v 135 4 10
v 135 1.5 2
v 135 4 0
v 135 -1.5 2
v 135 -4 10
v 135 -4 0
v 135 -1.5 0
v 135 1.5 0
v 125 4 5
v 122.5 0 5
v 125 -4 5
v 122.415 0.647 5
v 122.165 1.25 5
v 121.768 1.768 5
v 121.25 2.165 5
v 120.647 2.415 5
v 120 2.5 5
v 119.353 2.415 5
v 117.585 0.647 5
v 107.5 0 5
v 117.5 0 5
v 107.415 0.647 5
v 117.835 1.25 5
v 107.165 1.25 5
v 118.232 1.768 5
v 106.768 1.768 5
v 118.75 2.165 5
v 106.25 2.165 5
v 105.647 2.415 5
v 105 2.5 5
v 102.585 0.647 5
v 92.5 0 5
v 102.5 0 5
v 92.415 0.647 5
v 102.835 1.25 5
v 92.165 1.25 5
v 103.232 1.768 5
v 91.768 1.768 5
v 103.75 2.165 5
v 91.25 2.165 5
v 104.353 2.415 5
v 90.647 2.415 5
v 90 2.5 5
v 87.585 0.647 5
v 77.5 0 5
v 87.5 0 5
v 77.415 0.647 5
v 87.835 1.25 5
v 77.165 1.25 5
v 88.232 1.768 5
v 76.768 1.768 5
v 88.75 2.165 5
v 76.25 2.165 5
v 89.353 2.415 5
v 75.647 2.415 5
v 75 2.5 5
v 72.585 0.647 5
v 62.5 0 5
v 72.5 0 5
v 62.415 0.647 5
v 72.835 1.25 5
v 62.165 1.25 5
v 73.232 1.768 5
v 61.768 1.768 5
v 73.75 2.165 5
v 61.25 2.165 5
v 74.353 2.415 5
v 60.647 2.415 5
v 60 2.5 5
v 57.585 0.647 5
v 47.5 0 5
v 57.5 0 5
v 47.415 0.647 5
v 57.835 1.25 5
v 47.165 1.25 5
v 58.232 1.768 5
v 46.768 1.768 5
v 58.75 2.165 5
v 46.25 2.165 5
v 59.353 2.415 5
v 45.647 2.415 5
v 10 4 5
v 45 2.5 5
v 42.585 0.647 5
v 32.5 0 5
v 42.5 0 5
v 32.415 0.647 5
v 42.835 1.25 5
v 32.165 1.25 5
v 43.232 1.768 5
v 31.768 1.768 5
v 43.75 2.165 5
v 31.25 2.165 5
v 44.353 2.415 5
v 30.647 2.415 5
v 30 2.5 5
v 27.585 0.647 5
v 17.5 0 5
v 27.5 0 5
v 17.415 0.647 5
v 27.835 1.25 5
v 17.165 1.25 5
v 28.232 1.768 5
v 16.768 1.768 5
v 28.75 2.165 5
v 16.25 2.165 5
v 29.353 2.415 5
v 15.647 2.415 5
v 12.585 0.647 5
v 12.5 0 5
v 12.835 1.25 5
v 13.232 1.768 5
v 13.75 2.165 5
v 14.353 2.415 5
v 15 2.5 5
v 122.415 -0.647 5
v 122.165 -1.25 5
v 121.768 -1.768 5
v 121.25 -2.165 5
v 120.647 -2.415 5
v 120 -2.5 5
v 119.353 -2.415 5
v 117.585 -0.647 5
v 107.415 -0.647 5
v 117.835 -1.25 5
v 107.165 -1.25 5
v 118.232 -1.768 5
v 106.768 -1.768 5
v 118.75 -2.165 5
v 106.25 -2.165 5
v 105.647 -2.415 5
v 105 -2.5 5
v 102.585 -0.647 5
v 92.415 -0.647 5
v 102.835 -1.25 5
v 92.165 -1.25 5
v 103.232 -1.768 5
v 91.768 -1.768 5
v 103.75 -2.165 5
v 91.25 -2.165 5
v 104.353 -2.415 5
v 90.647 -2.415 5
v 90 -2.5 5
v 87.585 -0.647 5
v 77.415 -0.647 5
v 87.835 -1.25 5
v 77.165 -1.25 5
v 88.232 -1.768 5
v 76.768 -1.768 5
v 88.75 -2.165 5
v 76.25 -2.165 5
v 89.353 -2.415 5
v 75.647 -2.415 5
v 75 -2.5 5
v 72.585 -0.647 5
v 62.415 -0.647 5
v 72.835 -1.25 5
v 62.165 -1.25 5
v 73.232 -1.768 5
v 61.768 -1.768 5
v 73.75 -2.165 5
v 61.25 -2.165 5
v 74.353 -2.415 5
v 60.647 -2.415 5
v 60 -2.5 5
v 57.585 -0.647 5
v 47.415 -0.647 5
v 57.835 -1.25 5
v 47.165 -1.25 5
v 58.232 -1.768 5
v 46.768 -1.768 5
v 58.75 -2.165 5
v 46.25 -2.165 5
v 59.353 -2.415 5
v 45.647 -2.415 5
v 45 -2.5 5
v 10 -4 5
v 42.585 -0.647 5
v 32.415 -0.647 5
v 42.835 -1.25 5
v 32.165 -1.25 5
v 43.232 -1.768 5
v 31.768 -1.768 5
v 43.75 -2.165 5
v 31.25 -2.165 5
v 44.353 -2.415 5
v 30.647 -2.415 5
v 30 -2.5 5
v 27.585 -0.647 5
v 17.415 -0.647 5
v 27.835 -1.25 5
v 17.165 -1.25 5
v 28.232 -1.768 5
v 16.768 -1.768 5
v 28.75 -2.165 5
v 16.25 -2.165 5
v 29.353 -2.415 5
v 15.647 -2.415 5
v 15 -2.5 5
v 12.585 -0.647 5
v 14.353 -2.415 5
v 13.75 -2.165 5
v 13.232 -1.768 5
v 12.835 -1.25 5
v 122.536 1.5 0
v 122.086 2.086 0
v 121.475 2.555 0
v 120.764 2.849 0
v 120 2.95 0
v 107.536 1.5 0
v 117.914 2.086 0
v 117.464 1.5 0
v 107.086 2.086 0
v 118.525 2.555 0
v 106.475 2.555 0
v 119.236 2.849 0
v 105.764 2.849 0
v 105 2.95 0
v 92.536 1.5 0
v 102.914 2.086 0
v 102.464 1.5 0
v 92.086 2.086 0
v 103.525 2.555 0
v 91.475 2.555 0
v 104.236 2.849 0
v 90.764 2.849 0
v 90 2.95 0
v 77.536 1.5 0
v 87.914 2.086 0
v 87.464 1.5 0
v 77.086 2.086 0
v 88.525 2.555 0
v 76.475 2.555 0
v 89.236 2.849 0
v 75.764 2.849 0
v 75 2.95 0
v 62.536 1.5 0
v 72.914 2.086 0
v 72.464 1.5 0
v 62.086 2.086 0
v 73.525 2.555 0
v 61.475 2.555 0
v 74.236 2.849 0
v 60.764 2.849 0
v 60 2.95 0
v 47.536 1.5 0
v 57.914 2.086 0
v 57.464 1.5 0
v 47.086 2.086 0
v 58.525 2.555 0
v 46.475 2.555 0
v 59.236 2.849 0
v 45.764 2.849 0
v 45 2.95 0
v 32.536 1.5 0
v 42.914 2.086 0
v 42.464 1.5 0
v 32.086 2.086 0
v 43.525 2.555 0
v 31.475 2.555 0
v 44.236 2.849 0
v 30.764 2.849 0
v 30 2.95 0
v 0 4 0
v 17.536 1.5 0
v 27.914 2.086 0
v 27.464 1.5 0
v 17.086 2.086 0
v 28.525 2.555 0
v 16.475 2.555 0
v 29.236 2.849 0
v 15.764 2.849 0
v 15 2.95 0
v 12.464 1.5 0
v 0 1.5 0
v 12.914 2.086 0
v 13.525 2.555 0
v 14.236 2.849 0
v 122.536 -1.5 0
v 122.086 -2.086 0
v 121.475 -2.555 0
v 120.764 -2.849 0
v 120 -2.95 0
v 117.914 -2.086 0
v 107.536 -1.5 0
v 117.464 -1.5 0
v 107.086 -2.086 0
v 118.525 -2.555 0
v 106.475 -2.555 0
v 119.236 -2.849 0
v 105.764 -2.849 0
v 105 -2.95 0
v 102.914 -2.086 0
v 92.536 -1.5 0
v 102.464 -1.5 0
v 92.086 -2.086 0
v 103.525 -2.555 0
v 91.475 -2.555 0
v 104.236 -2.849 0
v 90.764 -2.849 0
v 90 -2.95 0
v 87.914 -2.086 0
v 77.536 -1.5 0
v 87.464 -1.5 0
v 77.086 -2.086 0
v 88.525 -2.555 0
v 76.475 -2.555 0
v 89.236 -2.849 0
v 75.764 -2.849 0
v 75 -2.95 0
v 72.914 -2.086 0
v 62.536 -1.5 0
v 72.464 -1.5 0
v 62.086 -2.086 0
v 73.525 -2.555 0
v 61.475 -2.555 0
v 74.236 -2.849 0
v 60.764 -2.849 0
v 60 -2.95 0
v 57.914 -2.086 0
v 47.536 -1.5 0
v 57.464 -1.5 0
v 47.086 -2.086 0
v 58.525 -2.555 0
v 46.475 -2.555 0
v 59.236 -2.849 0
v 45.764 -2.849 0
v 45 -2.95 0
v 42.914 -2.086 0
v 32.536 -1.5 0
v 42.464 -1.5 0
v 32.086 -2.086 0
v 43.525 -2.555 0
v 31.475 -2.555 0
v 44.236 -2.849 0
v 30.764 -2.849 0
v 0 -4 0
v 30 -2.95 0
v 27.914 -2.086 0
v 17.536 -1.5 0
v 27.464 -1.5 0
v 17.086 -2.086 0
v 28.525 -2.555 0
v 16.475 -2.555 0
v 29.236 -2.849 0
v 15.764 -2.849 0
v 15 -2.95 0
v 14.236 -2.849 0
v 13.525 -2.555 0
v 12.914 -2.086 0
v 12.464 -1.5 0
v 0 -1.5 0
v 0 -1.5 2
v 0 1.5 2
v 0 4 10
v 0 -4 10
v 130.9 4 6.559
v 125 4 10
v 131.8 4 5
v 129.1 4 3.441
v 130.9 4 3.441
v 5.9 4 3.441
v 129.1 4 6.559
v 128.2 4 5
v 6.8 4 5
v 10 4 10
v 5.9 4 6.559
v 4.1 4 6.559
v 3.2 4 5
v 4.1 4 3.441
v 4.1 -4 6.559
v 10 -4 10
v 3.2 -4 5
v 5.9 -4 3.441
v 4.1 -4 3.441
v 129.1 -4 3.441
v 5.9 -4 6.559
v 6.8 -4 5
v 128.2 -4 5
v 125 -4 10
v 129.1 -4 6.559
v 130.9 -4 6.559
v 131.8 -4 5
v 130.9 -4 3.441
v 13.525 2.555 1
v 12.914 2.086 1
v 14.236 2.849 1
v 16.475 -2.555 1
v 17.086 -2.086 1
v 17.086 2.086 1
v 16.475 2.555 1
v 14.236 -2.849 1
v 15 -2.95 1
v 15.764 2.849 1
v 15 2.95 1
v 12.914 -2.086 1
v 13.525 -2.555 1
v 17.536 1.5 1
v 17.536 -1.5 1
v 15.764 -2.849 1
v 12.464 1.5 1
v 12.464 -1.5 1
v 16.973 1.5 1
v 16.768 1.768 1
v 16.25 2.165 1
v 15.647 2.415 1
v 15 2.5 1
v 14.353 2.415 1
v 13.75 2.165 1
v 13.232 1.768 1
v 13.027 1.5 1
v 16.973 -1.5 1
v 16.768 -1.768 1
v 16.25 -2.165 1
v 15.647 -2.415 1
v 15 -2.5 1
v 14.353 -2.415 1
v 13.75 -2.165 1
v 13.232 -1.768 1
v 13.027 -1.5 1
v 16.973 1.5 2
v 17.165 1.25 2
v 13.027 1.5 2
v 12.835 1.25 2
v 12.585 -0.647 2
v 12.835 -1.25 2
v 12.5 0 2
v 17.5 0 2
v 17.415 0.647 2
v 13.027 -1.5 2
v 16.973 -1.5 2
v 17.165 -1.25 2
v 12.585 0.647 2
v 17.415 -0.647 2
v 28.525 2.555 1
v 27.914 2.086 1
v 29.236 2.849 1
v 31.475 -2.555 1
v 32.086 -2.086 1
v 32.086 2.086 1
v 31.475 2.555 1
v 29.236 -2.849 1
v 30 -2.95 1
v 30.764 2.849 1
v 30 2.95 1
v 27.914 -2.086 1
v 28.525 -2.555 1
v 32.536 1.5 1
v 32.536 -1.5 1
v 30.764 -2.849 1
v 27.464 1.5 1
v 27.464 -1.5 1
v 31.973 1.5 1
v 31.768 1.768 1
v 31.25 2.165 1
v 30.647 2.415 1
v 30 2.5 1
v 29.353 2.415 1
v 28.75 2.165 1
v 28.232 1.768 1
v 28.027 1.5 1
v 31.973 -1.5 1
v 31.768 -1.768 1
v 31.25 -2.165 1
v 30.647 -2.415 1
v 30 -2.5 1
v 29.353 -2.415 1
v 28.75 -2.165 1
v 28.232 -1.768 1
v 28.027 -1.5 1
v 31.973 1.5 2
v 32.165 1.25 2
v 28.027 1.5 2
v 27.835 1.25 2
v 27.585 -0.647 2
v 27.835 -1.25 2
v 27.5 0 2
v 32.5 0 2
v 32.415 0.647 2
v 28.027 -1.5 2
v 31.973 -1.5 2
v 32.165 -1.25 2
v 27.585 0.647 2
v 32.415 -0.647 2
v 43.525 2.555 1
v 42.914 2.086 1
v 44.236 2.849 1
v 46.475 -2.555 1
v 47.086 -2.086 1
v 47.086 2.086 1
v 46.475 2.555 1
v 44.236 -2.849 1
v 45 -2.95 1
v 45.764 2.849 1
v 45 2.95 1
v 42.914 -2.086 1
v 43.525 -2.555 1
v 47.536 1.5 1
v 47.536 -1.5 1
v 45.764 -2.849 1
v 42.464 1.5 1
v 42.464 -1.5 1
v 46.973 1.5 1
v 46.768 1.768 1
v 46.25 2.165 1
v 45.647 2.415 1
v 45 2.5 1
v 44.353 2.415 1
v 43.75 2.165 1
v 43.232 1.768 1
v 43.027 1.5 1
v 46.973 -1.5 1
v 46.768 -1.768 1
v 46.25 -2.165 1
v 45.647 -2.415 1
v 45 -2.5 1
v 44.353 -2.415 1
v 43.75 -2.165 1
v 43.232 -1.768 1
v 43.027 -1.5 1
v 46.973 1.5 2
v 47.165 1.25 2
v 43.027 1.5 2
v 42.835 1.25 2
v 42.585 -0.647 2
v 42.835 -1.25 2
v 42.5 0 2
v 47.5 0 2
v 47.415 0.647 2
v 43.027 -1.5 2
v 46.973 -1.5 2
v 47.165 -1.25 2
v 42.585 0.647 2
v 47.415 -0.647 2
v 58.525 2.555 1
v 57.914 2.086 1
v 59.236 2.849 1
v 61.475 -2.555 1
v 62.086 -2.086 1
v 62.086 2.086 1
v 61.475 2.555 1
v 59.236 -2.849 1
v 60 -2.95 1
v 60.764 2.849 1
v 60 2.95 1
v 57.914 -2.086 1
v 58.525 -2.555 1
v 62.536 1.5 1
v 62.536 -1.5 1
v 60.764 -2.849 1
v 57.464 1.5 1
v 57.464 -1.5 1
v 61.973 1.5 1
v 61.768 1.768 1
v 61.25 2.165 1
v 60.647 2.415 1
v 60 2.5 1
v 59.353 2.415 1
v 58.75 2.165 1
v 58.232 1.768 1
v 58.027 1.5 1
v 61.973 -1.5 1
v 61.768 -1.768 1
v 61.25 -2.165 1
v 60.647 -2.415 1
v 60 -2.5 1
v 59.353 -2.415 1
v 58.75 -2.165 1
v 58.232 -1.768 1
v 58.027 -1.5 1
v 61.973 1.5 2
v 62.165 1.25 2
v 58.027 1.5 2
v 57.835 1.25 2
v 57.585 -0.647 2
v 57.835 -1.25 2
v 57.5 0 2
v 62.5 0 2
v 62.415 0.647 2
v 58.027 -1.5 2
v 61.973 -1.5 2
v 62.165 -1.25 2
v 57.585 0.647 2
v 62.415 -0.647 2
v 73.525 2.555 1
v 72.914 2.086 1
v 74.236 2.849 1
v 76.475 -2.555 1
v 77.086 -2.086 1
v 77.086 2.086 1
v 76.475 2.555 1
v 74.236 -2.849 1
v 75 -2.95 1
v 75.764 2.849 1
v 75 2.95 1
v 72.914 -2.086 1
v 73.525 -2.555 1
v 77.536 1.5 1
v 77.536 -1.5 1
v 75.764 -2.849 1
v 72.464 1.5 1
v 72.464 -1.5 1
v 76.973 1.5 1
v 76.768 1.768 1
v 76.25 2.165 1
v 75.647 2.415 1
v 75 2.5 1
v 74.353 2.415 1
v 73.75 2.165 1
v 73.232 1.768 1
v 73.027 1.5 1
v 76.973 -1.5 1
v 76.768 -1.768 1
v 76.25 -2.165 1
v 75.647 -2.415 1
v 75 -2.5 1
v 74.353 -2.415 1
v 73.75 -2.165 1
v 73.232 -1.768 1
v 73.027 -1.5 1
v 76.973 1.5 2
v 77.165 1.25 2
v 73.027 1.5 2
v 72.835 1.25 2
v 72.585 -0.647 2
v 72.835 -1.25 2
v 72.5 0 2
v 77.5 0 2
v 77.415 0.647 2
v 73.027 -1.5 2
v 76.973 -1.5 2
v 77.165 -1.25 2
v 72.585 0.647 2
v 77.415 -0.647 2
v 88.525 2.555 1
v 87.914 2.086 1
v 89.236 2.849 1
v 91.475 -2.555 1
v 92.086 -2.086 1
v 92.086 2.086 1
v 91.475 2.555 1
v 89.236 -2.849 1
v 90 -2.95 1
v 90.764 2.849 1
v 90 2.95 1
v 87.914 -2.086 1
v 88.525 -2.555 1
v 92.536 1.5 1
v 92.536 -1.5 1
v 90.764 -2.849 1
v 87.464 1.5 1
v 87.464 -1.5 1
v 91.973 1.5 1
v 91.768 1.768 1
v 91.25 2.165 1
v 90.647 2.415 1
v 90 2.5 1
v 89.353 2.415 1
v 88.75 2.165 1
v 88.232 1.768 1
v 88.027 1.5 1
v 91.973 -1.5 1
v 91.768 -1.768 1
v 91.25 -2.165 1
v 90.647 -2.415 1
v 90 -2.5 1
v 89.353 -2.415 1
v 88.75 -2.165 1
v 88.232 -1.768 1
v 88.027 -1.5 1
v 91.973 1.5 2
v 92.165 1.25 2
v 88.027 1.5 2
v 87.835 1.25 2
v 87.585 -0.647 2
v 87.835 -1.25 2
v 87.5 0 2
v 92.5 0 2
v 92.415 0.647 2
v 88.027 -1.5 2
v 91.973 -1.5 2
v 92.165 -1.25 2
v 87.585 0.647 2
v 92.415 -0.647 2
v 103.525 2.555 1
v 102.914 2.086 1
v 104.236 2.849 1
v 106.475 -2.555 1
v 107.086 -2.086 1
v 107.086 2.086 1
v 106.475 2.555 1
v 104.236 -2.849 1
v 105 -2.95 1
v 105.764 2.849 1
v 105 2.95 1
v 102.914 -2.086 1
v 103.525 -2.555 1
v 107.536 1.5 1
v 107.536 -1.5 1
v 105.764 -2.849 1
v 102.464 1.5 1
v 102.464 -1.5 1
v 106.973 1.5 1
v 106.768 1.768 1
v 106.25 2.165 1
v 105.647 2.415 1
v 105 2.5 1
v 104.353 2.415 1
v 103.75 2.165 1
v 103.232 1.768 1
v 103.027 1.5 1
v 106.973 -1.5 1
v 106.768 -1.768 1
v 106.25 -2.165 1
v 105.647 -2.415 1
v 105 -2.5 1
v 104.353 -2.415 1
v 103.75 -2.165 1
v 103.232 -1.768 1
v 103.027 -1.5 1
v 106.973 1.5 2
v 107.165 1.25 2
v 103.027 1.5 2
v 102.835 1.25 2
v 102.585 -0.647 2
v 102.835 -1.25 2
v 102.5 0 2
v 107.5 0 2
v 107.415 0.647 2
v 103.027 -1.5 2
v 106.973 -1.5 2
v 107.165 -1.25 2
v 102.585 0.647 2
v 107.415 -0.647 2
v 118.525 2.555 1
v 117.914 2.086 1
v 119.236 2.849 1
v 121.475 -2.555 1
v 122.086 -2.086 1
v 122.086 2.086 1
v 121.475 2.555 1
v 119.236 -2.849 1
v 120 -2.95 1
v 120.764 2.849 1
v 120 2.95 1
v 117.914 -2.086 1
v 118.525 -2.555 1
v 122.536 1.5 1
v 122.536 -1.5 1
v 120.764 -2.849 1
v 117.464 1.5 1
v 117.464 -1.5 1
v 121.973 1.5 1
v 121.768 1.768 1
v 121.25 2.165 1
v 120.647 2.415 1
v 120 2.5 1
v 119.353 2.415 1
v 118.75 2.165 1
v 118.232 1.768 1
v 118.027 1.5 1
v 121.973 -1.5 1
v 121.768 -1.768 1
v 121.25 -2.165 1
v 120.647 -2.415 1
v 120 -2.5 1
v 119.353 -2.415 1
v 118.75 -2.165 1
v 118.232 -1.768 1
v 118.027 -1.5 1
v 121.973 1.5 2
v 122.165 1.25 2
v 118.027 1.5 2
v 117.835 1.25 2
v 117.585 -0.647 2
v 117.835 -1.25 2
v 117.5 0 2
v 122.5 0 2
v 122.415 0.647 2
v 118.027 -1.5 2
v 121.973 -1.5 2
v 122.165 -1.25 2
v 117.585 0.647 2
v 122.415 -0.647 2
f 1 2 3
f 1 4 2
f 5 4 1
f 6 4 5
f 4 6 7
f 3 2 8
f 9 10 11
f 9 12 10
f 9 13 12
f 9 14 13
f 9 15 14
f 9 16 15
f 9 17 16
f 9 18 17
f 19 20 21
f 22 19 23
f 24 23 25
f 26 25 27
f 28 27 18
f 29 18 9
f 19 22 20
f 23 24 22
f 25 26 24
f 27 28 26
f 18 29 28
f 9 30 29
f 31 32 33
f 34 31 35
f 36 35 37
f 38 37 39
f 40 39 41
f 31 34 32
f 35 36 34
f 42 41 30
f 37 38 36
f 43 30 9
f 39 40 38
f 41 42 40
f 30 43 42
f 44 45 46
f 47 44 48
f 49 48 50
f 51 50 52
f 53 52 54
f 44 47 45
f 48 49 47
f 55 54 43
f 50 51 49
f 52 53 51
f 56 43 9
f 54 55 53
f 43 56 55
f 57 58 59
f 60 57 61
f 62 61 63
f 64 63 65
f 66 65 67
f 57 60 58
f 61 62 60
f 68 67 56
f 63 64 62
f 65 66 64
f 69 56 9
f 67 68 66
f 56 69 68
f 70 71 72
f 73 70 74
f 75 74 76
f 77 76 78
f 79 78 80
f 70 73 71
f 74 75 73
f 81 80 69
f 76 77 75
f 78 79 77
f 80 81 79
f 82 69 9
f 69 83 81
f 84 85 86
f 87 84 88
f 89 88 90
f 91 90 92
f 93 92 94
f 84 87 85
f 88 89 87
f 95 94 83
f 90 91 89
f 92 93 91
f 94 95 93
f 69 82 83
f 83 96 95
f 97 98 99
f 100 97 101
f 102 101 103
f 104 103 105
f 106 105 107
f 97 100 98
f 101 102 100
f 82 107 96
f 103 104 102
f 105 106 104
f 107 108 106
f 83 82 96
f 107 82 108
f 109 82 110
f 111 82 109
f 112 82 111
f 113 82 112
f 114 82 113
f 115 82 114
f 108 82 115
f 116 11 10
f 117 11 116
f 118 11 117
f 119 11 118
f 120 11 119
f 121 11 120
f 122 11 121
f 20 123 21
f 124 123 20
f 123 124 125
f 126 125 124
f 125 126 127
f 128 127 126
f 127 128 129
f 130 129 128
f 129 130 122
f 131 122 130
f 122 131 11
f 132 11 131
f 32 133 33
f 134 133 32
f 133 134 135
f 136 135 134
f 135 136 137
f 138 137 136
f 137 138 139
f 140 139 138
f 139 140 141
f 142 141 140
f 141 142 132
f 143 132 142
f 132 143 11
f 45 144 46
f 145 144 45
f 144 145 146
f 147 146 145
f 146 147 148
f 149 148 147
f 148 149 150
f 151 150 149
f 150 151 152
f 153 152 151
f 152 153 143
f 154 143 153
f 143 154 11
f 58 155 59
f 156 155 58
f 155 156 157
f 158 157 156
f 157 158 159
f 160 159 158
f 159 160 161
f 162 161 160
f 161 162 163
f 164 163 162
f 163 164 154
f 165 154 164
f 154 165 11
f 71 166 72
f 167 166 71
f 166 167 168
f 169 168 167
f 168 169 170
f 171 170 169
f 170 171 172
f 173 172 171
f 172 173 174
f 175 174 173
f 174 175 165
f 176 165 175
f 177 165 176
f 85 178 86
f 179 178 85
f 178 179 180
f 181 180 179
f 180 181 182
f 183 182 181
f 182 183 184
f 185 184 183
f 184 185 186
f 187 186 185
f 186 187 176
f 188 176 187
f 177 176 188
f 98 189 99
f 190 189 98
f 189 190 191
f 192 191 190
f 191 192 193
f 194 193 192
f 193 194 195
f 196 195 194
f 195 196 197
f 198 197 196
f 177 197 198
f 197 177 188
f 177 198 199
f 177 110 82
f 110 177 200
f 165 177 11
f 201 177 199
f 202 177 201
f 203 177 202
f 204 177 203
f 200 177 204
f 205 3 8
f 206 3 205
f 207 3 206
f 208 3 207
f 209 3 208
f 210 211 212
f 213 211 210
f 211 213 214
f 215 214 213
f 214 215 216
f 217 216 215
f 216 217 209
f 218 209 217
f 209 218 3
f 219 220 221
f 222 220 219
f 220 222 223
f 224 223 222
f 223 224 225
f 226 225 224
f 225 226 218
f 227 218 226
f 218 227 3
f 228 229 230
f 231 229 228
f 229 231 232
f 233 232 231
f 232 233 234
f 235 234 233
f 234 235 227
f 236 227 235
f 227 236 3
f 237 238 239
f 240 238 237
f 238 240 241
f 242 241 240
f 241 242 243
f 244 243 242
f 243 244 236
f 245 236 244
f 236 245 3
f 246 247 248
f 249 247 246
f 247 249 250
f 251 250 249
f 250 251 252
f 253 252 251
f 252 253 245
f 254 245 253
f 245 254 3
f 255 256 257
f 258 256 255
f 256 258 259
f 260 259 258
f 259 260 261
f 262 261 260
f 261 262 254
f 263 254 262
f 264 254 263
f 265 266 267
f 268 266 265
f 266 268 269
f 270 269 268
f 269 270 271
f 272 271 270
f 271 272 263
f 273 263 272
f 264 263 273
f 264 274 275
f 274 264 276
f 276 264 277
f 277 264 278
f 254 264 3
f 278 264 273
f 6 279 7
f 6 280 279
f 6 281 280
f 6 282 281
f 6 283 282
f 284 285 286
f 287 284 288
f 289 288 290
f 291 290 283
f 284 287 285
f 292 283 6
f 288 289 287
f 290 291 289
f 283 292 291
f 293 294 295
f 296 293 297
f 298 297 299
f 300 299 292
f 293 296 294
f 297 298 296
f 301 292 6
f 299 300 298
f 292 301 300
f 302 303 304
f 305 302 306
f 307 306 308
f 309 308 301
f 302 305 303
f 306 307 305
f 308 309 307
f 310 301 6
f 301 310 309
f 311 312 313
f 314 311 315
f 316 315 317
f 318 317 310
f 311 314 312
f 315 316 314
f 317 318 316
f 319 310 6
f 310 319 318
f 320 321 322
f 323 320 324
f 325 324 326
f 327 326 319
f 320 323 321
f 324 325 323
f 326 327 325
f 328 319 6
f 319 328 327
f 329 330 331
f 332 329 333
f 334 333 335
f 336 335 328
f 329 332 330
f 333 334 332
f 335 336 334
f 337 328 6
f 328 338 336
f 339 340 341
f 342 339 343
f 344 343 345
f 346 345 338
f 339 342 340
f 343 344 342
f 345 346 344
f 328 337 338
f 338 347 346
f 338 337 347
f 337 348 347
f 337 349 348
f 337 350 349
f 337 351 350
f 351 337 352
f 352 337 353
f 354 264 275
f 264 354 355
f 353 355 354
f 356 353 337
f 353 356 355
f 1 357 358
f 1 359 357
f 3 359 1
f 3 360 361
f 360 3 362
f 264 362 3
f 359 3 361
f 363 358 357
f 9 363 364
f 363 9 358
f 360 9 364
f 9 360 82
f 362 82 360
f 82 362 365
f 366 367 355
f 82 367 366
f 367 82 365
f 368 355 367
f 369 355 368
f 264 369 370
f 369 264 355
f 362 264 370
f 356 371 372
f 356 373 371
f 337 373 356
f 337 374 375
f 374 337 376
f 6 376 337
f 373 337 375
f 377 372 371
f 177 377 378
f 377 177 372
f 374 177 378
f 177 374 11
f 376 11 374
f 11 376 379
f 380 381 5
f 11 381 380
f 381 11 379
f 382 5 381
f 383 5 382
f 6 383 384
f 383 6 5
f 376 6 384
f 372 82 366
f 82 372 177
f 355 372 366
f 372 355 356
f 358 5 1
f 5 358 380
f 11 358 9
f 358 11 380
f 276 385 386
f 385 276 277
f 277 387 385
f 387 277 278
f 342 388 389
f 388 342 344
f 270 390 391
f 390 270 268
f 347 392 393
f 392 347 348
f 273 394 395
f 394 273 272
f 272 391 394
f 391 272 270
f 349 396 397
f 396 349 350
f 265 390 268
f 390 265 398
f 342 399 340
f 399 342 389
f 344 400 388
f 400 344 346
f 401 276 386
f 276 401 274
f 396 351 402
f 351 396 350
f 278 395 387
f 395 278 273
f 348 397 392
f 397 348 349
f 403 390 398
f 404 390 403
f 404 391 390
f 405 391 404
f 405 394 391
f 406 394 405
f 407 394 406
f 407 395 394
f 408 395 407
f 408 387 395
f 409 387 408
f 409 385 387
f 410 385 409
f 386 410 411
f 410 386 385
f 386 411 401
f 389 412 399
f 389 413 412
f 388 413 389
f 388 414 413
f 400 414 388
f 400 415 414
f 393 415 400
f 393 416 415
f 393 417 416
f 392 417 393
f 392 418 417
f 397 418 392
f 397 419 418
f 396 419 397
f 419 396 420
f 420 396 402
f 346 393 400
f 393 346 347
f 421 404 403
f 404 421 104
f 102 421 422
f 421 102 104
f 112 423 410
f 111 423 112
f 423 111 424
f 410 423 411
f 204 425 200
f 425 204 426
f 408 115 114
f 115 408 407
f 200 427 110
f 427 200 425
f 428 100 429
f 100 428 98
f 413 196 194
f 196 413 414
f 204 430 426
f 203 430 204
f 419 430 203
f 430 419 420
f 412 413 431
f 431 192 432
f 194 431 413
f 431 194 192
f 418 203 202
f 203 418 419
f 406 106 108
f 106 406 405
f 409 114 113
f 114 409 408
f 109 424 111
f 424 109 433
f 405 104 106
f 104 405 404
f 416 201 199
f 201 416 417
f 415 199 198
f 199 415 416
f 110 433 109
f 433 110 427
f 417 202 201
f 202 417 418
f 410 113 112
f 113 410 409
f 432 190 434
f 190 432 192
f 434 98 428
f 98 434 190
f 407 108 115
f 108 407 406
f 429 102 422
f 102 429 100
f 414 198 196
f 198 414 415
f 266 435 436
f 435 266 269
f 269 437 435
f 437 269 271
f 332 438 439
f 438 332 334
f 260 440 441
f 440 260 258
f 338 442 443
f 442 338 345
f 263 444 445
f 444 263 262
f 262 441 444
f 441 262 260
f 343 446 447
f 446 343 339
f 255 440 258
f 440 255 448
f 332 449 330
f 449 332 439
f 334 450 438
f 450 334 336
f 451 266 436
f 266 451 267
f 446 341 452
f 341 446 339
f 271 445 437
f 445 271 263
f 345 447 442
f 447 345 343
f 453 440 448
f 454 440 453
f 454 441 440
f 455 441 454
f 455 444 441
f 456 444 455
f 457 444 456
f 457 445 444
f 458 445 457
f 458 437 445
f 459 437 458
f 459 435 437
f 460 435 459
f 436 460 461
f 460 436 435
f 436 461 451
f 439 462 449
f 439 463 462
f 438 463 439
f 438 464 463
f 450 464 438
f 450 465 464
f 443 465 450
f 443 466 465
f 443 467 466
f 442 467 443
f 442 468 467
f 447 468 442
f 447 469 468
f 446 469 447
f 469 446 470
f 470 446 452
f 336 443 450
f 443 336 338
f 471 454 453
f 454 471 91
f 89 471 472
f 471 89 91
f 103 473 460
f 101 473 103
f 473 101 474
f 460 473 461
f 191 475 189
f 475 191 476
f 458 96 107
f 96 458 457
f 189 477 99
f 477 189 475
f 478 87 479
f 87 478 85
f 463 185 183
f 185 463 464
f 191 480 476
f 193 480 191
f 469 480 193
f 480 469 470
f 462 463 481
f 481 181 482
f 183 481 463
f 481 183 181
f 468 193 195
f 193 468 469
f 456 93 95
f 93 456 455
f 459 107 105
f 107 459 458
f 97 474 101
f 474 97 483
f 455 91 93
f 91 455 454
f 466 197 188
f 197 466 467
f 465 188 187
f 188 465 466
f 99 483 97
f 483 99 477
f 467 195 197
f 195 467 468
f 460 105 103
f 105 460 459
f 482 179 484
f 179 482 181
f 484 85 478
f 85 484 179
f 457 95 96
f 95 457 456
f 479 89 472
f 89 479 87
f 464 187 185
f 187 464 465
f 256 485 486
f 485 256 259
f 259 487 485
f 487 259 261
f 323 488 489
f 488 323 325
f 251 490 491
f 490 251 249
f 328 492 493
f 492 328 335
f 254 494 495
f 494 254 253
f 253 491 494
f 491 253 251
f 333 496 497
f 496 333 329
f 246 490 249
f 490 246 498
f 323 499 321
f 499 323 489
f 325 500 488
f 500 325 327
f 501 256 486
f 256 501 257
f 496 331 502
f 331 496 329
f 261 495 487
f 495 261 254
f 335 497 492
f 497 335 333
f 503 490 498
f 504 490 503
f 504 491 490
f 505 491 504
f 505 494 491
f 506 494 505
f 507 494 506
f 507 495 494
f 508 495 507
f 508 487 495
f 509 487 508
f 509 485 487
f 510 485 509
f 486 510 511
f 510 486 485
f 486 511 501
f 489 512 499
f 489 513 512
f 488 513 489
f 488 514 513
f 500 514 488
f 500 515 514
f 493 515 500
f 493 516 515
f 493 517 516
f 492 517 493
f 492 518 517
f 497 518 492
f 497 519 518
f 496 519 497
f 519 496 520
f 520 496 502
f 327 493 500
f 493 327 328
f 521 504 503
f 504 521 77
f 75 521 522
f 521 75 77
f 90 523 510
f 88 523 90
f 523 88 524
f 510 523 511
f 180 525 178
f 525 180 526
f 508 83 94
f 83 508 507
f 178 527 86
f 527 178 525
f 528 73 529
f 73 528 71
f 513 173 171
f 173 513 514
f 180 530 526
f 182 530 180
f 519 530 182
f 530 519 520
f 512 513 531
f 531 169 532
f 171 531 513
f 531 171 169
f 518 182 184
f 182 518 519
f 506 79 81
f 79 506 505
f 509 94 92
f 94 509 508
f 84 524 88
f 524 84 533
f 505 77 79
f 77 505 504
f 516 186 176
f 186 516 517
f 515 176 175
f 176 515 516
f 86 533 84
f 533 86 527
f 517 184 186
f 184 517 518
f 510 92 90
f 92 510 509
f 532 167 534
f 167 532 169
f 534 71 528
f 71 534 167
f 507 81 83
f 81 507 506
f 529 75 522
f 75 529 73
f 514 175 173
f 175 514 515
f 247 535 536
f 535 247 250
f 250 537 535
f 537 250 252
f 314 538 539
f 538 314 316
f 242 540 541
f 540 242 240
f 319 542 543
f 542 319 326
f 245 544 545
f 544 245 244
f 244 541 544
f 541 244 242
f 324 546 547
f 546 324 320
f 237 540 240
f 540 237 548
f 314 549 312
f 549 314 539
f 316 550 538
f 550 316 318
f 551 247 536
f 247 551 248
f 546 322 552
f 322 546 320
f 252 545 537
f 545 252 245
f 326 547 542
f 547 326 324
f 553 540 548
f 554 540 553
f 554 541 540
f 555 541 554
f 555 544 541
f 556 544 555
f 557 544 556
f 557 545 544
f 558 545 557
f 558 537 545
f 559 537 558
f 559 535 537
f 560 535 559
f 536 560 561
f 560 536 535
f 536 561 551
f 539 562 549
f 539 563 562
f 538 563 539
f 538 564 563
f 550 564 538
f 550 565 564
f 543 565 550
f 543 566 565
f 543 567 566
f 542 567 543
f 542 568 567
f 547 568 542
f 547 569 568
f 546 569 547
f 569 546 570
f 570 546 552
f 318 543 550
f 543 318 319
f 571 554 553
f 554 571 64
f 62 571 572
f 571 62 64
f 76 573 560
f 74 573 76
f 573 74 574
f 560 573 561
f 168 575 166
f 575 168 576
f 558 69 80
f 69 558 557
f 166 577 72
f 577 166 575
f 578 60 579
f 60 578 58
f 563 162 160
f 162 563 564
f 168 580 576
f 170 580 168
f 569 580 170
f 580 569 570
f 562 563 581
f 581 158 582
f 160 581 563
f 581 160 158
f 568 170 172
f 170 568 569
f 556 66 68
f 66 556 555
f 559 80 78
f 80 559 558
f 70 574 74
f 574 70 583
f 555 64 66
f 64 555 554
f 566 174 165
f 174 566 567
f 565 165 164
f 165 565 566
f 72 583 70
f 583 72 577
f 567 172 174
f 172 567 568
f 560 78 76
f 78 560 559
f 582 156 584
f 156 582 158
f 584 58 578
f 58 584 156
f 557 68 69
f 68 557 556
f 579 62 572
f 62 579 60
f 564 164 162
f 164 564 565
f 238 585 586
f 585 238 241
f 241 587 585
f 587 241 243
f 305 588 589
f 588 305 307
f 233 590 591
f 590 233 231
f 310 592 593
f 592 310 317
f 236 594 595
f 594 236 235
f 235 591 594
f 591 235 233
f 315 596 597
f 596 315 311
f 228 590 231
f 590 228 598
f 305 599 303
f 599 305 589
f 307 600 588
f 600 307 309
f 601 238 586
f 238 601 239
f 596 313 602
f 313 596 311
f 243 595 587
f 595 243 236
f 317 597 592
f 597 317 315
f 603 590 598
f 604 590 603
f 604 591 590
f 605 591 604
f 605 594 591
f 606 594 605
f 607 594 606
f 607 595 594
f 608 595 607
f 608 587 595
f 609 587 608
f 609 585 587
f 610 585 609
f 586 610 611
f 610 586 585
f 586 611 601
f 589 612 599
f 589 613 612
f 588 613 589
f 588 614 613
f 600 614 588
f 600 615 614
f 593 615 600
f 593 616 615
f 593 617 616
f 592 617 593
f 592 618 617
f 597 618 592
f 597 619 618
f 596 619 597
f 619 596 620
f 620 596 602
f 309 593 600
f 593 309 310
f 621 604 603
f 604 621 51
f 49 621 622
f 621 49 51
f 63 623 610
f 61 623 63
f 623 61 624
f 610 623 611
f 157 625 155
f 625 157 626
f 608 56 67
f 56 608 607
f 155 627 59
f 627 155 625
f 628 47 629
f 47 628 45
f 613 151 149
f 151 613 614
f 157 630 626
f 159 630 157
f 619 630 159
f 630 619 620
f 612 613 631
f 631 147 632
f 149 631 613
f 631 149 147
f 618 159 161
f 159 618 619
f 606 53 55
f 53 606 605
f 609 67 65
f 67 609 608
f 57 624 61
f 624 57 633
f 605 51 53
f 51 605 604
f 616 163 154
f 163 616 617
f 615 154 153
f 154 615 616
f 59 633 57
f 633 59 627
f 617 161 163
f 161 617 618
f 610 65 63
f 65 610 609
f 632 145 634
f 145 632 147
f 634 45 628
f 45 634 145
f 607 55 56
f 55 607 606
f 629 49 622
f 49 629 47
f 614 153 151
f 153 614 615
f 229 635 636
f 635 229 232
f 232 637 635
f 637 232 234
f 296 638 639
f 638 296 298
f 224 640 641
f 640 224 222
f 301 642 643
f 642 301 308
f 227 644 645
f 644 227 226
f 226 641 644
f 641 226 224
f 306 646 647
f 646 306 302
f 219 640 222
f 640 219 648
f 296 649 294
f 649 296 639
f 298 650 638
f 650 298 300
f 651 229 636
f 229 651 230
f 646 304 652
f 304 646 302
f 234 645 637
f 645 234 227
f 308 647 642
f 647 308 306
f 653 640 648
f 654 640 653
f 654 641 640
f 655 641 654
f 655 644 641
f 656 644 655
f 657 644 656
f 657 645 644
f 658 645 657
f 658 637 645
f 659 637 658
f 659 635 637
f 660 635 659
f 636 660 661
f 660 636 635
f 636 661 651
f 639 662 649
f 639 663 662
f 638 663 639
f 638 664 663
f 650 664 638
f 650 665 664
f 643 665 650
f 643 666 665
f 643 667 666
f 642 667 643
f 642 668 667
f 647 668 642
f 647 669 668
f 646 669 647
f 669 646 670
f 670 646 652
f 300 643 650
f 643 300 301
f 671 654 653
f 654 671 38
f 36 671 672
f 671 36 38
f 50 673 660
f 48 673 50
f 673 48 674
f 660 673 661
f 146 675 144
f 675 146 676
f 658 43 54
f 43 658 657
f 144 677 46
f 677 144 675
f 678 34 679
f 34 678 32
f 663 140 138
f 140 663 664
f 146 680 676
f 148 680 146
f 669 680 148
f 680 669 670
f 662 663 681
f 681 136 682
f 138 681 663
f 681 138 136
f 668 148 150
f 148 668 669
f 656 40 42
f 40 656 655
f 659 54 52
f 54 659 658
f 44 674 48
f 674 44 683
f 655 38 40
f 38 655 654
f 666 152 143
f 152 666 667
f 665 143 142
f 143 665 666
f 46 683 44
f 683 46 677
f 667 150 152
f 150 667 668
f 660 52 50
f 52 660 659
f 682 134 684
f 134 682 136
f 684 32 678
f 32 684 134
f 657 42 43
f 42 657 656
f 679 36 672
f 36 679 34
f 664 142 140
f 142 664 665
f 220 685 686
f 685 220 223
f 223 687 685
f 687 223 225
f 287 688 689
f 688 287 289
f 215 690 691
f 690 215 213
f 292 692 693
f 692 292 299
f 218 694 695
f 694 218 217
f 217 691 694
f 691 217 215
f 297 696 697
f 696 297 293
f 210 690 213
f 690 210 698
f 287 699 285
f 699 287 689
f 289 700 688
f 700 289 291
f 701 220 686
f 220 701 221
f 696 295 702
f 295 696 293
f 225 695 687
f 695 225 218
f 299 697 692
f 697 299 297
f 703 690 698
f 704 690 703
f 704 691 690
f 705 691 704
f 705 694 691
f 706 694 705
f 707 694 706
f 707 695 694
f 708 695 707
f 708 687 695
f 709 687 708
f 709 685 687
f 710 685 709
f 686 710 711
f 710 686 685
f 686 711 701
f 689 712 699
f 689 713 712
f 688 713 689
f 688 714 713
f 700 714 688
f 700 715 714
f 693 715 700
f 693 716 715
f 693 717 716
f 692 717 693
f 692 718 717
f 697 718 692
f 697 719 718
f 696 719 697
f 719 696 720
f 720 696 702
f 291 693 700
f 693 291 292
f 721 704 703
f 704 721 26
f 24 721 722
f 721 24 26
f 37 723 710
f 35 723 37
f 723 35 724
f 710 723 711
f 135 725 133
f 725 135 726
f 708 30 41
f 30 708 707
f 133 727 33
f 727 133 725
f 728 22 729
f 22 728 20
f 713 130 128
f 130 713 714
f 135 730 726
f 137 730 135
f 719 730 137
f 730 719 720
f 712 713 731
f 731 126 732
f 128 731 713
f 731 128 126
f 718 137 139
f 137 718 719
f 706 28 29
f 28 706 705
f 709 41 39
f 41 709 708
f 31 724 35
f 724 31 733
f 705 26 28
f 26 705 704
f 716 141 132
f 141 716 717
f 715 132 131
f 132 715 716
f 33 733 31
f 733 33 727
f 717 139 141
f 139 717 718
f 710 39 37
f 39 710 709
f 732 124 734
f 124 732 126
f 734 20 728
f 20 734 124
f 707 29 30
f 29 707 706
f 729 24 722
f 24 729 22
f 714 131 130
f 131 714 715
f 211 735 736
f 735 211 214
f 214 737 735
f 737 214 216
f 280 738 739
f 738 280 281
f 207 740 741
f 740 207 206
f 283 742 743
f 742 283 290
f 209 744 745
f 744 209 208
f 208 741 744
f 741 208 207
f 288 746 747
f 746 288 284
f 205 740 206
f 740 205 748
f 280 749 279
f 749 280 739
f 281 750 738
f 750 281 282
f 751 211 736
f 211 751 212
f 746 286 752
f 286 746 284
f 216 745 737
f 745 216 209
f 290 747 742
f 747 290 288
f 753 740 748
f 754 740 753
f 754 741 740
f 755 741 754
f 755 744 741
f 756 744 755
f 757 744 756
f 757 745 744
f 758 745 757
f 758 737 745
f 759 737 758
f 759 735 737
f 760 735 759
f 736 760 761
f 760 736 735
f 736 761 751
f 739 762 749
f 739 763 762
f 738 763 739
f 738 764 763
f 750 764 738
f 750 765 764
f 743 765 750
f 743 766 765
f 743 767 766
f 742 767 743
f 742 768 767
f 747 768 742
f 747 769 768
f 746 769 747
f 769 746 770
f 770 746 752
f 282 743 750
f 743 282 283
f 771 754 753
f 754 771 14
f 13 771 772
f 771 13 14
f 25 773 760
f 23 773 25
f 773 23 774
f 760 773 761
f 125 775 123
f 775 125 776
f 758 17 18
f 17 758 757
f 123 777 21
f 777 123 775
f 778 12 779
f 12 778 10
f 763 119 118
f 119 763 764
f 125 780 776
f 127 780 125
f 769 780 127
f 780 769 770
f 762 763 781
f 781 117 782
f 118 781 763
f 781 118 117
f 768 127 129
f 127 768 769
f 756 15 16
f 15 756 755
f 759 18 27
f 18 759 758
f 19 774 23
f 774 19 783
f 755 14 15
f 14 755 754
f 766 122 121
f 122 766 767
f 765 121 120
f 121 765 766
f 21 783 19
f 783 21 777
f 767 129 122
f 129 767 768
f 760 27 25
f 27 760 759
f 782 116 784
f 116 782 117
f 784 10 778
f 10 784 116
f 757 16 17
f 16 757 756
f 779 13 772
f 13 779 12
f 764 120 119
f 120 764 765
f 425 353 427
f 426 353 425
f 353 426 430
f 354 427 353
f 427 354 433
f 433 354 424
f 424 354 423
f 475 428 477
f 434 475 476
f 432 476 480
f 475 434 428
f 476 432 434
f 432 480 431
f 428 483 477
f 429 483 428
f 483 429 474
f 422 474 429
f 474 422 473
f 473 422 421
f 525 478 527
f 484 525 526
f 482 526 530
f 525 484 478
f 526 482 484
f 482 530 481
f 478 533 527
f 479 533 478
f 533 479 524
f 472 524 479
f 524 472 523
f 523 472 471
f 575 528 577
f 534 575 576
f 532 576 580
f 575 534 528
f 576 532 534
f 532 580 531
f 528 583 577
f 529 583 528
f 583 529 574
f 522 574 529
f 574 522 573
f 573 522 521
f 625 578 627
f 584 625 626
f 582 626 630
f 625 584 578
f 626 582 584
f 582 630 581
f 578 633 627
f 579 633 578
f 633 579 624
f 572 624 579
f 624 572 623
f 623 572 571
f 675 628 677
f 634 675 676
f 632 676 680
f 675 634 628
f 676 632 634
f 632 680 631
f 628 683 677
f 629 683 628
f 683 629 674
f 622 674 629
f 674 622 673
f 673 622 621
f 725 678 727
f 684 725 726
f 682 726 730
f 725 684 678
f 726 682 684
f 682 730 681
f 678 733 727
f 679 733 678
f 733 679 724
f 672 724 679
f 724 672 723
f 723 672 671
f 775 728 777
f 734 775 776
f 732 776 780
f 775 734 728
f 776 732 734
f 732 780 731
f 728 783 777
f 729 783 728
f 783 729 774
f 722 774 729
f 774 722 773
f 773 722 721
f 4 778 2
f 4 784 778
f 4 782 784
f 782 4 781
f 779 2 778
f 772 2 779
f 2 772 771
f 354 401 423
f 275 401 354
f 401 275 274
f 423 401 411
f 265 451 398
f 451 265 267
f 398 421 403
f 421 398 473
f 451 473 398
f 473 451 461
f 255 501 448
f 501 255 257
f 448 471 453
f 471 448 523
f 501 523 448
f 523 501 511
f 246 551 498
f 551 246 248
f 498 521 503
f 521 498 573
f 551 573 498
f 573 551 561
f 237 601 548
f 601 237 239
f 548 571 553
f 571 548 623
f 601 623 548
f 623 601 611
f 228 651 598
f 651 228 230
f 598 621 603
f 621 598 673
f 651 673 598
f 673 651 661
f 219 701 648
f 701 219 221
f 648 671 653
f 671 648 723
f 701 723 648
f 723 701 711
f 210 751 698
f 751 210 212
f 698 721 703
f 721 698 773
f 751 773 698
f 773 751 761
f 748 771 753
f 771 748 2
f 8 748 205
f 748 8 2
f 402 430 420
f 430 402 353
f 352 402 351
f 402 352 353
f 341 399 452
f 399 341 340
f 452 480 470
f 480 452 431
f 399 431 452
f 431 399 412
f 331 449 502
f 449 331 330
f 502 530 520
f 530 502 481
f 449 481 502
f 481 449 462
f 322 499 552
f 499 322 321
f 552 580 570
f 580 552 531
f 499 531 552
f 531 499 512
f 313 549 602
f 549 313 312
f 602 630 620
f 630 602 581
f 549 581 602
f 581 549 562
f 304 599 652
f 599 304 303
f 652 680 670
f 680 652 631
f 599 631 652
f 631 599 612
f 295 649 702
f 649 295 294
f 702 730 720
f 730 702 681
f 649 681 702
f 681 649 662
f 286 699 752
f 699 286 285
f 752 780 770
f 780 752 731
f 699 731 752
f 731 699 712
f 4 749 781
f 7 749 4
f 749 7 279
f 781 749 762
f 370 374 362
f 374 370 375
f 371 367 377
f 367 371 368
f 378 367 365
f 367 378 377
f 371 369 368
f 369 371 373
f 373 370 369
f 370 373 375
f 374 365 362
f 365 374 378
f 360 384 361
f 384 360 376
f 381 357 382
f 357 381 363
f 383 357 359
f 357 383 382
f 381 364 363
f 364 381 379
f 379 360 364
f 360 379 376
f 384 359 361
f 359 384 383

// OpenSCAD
number_of_Leds = 8;

module LED()
{
    cylinder(r=2.95, h=1, $fn=24);
    hull()
    {
    translate([0,0,1])cylinder(r=2.5, h=5.1, $fn=24);
    translate([0,0,6.1])sphere(r=2.5, $fn=24);
    }
}

render(10)
difference()
{
    union(){
        translate([0,-4,0])cube([15*number_of_Leds+15,8,5]);
        translate([0,-4,0])cube([10,8,10]);
        translate([15*number_of_Leds+5,-4,0])cube([10,8,10]);
    }
    for (x=[1:number_of_Leds])
    {
        translate([15*x,0,0])LED();
    }
    translate([0,-1.5,0])cube([15*number_of_Leds+20,3,2]);
    
    //screwholes
    translate([5,5,5])rotate([90,0,0])cylinder(r=1.8,h=10);
    translate([15*number_of_Leds + 10,5,5])rotate([90,0,0])cylinder(r=1.8,h=10);
}
